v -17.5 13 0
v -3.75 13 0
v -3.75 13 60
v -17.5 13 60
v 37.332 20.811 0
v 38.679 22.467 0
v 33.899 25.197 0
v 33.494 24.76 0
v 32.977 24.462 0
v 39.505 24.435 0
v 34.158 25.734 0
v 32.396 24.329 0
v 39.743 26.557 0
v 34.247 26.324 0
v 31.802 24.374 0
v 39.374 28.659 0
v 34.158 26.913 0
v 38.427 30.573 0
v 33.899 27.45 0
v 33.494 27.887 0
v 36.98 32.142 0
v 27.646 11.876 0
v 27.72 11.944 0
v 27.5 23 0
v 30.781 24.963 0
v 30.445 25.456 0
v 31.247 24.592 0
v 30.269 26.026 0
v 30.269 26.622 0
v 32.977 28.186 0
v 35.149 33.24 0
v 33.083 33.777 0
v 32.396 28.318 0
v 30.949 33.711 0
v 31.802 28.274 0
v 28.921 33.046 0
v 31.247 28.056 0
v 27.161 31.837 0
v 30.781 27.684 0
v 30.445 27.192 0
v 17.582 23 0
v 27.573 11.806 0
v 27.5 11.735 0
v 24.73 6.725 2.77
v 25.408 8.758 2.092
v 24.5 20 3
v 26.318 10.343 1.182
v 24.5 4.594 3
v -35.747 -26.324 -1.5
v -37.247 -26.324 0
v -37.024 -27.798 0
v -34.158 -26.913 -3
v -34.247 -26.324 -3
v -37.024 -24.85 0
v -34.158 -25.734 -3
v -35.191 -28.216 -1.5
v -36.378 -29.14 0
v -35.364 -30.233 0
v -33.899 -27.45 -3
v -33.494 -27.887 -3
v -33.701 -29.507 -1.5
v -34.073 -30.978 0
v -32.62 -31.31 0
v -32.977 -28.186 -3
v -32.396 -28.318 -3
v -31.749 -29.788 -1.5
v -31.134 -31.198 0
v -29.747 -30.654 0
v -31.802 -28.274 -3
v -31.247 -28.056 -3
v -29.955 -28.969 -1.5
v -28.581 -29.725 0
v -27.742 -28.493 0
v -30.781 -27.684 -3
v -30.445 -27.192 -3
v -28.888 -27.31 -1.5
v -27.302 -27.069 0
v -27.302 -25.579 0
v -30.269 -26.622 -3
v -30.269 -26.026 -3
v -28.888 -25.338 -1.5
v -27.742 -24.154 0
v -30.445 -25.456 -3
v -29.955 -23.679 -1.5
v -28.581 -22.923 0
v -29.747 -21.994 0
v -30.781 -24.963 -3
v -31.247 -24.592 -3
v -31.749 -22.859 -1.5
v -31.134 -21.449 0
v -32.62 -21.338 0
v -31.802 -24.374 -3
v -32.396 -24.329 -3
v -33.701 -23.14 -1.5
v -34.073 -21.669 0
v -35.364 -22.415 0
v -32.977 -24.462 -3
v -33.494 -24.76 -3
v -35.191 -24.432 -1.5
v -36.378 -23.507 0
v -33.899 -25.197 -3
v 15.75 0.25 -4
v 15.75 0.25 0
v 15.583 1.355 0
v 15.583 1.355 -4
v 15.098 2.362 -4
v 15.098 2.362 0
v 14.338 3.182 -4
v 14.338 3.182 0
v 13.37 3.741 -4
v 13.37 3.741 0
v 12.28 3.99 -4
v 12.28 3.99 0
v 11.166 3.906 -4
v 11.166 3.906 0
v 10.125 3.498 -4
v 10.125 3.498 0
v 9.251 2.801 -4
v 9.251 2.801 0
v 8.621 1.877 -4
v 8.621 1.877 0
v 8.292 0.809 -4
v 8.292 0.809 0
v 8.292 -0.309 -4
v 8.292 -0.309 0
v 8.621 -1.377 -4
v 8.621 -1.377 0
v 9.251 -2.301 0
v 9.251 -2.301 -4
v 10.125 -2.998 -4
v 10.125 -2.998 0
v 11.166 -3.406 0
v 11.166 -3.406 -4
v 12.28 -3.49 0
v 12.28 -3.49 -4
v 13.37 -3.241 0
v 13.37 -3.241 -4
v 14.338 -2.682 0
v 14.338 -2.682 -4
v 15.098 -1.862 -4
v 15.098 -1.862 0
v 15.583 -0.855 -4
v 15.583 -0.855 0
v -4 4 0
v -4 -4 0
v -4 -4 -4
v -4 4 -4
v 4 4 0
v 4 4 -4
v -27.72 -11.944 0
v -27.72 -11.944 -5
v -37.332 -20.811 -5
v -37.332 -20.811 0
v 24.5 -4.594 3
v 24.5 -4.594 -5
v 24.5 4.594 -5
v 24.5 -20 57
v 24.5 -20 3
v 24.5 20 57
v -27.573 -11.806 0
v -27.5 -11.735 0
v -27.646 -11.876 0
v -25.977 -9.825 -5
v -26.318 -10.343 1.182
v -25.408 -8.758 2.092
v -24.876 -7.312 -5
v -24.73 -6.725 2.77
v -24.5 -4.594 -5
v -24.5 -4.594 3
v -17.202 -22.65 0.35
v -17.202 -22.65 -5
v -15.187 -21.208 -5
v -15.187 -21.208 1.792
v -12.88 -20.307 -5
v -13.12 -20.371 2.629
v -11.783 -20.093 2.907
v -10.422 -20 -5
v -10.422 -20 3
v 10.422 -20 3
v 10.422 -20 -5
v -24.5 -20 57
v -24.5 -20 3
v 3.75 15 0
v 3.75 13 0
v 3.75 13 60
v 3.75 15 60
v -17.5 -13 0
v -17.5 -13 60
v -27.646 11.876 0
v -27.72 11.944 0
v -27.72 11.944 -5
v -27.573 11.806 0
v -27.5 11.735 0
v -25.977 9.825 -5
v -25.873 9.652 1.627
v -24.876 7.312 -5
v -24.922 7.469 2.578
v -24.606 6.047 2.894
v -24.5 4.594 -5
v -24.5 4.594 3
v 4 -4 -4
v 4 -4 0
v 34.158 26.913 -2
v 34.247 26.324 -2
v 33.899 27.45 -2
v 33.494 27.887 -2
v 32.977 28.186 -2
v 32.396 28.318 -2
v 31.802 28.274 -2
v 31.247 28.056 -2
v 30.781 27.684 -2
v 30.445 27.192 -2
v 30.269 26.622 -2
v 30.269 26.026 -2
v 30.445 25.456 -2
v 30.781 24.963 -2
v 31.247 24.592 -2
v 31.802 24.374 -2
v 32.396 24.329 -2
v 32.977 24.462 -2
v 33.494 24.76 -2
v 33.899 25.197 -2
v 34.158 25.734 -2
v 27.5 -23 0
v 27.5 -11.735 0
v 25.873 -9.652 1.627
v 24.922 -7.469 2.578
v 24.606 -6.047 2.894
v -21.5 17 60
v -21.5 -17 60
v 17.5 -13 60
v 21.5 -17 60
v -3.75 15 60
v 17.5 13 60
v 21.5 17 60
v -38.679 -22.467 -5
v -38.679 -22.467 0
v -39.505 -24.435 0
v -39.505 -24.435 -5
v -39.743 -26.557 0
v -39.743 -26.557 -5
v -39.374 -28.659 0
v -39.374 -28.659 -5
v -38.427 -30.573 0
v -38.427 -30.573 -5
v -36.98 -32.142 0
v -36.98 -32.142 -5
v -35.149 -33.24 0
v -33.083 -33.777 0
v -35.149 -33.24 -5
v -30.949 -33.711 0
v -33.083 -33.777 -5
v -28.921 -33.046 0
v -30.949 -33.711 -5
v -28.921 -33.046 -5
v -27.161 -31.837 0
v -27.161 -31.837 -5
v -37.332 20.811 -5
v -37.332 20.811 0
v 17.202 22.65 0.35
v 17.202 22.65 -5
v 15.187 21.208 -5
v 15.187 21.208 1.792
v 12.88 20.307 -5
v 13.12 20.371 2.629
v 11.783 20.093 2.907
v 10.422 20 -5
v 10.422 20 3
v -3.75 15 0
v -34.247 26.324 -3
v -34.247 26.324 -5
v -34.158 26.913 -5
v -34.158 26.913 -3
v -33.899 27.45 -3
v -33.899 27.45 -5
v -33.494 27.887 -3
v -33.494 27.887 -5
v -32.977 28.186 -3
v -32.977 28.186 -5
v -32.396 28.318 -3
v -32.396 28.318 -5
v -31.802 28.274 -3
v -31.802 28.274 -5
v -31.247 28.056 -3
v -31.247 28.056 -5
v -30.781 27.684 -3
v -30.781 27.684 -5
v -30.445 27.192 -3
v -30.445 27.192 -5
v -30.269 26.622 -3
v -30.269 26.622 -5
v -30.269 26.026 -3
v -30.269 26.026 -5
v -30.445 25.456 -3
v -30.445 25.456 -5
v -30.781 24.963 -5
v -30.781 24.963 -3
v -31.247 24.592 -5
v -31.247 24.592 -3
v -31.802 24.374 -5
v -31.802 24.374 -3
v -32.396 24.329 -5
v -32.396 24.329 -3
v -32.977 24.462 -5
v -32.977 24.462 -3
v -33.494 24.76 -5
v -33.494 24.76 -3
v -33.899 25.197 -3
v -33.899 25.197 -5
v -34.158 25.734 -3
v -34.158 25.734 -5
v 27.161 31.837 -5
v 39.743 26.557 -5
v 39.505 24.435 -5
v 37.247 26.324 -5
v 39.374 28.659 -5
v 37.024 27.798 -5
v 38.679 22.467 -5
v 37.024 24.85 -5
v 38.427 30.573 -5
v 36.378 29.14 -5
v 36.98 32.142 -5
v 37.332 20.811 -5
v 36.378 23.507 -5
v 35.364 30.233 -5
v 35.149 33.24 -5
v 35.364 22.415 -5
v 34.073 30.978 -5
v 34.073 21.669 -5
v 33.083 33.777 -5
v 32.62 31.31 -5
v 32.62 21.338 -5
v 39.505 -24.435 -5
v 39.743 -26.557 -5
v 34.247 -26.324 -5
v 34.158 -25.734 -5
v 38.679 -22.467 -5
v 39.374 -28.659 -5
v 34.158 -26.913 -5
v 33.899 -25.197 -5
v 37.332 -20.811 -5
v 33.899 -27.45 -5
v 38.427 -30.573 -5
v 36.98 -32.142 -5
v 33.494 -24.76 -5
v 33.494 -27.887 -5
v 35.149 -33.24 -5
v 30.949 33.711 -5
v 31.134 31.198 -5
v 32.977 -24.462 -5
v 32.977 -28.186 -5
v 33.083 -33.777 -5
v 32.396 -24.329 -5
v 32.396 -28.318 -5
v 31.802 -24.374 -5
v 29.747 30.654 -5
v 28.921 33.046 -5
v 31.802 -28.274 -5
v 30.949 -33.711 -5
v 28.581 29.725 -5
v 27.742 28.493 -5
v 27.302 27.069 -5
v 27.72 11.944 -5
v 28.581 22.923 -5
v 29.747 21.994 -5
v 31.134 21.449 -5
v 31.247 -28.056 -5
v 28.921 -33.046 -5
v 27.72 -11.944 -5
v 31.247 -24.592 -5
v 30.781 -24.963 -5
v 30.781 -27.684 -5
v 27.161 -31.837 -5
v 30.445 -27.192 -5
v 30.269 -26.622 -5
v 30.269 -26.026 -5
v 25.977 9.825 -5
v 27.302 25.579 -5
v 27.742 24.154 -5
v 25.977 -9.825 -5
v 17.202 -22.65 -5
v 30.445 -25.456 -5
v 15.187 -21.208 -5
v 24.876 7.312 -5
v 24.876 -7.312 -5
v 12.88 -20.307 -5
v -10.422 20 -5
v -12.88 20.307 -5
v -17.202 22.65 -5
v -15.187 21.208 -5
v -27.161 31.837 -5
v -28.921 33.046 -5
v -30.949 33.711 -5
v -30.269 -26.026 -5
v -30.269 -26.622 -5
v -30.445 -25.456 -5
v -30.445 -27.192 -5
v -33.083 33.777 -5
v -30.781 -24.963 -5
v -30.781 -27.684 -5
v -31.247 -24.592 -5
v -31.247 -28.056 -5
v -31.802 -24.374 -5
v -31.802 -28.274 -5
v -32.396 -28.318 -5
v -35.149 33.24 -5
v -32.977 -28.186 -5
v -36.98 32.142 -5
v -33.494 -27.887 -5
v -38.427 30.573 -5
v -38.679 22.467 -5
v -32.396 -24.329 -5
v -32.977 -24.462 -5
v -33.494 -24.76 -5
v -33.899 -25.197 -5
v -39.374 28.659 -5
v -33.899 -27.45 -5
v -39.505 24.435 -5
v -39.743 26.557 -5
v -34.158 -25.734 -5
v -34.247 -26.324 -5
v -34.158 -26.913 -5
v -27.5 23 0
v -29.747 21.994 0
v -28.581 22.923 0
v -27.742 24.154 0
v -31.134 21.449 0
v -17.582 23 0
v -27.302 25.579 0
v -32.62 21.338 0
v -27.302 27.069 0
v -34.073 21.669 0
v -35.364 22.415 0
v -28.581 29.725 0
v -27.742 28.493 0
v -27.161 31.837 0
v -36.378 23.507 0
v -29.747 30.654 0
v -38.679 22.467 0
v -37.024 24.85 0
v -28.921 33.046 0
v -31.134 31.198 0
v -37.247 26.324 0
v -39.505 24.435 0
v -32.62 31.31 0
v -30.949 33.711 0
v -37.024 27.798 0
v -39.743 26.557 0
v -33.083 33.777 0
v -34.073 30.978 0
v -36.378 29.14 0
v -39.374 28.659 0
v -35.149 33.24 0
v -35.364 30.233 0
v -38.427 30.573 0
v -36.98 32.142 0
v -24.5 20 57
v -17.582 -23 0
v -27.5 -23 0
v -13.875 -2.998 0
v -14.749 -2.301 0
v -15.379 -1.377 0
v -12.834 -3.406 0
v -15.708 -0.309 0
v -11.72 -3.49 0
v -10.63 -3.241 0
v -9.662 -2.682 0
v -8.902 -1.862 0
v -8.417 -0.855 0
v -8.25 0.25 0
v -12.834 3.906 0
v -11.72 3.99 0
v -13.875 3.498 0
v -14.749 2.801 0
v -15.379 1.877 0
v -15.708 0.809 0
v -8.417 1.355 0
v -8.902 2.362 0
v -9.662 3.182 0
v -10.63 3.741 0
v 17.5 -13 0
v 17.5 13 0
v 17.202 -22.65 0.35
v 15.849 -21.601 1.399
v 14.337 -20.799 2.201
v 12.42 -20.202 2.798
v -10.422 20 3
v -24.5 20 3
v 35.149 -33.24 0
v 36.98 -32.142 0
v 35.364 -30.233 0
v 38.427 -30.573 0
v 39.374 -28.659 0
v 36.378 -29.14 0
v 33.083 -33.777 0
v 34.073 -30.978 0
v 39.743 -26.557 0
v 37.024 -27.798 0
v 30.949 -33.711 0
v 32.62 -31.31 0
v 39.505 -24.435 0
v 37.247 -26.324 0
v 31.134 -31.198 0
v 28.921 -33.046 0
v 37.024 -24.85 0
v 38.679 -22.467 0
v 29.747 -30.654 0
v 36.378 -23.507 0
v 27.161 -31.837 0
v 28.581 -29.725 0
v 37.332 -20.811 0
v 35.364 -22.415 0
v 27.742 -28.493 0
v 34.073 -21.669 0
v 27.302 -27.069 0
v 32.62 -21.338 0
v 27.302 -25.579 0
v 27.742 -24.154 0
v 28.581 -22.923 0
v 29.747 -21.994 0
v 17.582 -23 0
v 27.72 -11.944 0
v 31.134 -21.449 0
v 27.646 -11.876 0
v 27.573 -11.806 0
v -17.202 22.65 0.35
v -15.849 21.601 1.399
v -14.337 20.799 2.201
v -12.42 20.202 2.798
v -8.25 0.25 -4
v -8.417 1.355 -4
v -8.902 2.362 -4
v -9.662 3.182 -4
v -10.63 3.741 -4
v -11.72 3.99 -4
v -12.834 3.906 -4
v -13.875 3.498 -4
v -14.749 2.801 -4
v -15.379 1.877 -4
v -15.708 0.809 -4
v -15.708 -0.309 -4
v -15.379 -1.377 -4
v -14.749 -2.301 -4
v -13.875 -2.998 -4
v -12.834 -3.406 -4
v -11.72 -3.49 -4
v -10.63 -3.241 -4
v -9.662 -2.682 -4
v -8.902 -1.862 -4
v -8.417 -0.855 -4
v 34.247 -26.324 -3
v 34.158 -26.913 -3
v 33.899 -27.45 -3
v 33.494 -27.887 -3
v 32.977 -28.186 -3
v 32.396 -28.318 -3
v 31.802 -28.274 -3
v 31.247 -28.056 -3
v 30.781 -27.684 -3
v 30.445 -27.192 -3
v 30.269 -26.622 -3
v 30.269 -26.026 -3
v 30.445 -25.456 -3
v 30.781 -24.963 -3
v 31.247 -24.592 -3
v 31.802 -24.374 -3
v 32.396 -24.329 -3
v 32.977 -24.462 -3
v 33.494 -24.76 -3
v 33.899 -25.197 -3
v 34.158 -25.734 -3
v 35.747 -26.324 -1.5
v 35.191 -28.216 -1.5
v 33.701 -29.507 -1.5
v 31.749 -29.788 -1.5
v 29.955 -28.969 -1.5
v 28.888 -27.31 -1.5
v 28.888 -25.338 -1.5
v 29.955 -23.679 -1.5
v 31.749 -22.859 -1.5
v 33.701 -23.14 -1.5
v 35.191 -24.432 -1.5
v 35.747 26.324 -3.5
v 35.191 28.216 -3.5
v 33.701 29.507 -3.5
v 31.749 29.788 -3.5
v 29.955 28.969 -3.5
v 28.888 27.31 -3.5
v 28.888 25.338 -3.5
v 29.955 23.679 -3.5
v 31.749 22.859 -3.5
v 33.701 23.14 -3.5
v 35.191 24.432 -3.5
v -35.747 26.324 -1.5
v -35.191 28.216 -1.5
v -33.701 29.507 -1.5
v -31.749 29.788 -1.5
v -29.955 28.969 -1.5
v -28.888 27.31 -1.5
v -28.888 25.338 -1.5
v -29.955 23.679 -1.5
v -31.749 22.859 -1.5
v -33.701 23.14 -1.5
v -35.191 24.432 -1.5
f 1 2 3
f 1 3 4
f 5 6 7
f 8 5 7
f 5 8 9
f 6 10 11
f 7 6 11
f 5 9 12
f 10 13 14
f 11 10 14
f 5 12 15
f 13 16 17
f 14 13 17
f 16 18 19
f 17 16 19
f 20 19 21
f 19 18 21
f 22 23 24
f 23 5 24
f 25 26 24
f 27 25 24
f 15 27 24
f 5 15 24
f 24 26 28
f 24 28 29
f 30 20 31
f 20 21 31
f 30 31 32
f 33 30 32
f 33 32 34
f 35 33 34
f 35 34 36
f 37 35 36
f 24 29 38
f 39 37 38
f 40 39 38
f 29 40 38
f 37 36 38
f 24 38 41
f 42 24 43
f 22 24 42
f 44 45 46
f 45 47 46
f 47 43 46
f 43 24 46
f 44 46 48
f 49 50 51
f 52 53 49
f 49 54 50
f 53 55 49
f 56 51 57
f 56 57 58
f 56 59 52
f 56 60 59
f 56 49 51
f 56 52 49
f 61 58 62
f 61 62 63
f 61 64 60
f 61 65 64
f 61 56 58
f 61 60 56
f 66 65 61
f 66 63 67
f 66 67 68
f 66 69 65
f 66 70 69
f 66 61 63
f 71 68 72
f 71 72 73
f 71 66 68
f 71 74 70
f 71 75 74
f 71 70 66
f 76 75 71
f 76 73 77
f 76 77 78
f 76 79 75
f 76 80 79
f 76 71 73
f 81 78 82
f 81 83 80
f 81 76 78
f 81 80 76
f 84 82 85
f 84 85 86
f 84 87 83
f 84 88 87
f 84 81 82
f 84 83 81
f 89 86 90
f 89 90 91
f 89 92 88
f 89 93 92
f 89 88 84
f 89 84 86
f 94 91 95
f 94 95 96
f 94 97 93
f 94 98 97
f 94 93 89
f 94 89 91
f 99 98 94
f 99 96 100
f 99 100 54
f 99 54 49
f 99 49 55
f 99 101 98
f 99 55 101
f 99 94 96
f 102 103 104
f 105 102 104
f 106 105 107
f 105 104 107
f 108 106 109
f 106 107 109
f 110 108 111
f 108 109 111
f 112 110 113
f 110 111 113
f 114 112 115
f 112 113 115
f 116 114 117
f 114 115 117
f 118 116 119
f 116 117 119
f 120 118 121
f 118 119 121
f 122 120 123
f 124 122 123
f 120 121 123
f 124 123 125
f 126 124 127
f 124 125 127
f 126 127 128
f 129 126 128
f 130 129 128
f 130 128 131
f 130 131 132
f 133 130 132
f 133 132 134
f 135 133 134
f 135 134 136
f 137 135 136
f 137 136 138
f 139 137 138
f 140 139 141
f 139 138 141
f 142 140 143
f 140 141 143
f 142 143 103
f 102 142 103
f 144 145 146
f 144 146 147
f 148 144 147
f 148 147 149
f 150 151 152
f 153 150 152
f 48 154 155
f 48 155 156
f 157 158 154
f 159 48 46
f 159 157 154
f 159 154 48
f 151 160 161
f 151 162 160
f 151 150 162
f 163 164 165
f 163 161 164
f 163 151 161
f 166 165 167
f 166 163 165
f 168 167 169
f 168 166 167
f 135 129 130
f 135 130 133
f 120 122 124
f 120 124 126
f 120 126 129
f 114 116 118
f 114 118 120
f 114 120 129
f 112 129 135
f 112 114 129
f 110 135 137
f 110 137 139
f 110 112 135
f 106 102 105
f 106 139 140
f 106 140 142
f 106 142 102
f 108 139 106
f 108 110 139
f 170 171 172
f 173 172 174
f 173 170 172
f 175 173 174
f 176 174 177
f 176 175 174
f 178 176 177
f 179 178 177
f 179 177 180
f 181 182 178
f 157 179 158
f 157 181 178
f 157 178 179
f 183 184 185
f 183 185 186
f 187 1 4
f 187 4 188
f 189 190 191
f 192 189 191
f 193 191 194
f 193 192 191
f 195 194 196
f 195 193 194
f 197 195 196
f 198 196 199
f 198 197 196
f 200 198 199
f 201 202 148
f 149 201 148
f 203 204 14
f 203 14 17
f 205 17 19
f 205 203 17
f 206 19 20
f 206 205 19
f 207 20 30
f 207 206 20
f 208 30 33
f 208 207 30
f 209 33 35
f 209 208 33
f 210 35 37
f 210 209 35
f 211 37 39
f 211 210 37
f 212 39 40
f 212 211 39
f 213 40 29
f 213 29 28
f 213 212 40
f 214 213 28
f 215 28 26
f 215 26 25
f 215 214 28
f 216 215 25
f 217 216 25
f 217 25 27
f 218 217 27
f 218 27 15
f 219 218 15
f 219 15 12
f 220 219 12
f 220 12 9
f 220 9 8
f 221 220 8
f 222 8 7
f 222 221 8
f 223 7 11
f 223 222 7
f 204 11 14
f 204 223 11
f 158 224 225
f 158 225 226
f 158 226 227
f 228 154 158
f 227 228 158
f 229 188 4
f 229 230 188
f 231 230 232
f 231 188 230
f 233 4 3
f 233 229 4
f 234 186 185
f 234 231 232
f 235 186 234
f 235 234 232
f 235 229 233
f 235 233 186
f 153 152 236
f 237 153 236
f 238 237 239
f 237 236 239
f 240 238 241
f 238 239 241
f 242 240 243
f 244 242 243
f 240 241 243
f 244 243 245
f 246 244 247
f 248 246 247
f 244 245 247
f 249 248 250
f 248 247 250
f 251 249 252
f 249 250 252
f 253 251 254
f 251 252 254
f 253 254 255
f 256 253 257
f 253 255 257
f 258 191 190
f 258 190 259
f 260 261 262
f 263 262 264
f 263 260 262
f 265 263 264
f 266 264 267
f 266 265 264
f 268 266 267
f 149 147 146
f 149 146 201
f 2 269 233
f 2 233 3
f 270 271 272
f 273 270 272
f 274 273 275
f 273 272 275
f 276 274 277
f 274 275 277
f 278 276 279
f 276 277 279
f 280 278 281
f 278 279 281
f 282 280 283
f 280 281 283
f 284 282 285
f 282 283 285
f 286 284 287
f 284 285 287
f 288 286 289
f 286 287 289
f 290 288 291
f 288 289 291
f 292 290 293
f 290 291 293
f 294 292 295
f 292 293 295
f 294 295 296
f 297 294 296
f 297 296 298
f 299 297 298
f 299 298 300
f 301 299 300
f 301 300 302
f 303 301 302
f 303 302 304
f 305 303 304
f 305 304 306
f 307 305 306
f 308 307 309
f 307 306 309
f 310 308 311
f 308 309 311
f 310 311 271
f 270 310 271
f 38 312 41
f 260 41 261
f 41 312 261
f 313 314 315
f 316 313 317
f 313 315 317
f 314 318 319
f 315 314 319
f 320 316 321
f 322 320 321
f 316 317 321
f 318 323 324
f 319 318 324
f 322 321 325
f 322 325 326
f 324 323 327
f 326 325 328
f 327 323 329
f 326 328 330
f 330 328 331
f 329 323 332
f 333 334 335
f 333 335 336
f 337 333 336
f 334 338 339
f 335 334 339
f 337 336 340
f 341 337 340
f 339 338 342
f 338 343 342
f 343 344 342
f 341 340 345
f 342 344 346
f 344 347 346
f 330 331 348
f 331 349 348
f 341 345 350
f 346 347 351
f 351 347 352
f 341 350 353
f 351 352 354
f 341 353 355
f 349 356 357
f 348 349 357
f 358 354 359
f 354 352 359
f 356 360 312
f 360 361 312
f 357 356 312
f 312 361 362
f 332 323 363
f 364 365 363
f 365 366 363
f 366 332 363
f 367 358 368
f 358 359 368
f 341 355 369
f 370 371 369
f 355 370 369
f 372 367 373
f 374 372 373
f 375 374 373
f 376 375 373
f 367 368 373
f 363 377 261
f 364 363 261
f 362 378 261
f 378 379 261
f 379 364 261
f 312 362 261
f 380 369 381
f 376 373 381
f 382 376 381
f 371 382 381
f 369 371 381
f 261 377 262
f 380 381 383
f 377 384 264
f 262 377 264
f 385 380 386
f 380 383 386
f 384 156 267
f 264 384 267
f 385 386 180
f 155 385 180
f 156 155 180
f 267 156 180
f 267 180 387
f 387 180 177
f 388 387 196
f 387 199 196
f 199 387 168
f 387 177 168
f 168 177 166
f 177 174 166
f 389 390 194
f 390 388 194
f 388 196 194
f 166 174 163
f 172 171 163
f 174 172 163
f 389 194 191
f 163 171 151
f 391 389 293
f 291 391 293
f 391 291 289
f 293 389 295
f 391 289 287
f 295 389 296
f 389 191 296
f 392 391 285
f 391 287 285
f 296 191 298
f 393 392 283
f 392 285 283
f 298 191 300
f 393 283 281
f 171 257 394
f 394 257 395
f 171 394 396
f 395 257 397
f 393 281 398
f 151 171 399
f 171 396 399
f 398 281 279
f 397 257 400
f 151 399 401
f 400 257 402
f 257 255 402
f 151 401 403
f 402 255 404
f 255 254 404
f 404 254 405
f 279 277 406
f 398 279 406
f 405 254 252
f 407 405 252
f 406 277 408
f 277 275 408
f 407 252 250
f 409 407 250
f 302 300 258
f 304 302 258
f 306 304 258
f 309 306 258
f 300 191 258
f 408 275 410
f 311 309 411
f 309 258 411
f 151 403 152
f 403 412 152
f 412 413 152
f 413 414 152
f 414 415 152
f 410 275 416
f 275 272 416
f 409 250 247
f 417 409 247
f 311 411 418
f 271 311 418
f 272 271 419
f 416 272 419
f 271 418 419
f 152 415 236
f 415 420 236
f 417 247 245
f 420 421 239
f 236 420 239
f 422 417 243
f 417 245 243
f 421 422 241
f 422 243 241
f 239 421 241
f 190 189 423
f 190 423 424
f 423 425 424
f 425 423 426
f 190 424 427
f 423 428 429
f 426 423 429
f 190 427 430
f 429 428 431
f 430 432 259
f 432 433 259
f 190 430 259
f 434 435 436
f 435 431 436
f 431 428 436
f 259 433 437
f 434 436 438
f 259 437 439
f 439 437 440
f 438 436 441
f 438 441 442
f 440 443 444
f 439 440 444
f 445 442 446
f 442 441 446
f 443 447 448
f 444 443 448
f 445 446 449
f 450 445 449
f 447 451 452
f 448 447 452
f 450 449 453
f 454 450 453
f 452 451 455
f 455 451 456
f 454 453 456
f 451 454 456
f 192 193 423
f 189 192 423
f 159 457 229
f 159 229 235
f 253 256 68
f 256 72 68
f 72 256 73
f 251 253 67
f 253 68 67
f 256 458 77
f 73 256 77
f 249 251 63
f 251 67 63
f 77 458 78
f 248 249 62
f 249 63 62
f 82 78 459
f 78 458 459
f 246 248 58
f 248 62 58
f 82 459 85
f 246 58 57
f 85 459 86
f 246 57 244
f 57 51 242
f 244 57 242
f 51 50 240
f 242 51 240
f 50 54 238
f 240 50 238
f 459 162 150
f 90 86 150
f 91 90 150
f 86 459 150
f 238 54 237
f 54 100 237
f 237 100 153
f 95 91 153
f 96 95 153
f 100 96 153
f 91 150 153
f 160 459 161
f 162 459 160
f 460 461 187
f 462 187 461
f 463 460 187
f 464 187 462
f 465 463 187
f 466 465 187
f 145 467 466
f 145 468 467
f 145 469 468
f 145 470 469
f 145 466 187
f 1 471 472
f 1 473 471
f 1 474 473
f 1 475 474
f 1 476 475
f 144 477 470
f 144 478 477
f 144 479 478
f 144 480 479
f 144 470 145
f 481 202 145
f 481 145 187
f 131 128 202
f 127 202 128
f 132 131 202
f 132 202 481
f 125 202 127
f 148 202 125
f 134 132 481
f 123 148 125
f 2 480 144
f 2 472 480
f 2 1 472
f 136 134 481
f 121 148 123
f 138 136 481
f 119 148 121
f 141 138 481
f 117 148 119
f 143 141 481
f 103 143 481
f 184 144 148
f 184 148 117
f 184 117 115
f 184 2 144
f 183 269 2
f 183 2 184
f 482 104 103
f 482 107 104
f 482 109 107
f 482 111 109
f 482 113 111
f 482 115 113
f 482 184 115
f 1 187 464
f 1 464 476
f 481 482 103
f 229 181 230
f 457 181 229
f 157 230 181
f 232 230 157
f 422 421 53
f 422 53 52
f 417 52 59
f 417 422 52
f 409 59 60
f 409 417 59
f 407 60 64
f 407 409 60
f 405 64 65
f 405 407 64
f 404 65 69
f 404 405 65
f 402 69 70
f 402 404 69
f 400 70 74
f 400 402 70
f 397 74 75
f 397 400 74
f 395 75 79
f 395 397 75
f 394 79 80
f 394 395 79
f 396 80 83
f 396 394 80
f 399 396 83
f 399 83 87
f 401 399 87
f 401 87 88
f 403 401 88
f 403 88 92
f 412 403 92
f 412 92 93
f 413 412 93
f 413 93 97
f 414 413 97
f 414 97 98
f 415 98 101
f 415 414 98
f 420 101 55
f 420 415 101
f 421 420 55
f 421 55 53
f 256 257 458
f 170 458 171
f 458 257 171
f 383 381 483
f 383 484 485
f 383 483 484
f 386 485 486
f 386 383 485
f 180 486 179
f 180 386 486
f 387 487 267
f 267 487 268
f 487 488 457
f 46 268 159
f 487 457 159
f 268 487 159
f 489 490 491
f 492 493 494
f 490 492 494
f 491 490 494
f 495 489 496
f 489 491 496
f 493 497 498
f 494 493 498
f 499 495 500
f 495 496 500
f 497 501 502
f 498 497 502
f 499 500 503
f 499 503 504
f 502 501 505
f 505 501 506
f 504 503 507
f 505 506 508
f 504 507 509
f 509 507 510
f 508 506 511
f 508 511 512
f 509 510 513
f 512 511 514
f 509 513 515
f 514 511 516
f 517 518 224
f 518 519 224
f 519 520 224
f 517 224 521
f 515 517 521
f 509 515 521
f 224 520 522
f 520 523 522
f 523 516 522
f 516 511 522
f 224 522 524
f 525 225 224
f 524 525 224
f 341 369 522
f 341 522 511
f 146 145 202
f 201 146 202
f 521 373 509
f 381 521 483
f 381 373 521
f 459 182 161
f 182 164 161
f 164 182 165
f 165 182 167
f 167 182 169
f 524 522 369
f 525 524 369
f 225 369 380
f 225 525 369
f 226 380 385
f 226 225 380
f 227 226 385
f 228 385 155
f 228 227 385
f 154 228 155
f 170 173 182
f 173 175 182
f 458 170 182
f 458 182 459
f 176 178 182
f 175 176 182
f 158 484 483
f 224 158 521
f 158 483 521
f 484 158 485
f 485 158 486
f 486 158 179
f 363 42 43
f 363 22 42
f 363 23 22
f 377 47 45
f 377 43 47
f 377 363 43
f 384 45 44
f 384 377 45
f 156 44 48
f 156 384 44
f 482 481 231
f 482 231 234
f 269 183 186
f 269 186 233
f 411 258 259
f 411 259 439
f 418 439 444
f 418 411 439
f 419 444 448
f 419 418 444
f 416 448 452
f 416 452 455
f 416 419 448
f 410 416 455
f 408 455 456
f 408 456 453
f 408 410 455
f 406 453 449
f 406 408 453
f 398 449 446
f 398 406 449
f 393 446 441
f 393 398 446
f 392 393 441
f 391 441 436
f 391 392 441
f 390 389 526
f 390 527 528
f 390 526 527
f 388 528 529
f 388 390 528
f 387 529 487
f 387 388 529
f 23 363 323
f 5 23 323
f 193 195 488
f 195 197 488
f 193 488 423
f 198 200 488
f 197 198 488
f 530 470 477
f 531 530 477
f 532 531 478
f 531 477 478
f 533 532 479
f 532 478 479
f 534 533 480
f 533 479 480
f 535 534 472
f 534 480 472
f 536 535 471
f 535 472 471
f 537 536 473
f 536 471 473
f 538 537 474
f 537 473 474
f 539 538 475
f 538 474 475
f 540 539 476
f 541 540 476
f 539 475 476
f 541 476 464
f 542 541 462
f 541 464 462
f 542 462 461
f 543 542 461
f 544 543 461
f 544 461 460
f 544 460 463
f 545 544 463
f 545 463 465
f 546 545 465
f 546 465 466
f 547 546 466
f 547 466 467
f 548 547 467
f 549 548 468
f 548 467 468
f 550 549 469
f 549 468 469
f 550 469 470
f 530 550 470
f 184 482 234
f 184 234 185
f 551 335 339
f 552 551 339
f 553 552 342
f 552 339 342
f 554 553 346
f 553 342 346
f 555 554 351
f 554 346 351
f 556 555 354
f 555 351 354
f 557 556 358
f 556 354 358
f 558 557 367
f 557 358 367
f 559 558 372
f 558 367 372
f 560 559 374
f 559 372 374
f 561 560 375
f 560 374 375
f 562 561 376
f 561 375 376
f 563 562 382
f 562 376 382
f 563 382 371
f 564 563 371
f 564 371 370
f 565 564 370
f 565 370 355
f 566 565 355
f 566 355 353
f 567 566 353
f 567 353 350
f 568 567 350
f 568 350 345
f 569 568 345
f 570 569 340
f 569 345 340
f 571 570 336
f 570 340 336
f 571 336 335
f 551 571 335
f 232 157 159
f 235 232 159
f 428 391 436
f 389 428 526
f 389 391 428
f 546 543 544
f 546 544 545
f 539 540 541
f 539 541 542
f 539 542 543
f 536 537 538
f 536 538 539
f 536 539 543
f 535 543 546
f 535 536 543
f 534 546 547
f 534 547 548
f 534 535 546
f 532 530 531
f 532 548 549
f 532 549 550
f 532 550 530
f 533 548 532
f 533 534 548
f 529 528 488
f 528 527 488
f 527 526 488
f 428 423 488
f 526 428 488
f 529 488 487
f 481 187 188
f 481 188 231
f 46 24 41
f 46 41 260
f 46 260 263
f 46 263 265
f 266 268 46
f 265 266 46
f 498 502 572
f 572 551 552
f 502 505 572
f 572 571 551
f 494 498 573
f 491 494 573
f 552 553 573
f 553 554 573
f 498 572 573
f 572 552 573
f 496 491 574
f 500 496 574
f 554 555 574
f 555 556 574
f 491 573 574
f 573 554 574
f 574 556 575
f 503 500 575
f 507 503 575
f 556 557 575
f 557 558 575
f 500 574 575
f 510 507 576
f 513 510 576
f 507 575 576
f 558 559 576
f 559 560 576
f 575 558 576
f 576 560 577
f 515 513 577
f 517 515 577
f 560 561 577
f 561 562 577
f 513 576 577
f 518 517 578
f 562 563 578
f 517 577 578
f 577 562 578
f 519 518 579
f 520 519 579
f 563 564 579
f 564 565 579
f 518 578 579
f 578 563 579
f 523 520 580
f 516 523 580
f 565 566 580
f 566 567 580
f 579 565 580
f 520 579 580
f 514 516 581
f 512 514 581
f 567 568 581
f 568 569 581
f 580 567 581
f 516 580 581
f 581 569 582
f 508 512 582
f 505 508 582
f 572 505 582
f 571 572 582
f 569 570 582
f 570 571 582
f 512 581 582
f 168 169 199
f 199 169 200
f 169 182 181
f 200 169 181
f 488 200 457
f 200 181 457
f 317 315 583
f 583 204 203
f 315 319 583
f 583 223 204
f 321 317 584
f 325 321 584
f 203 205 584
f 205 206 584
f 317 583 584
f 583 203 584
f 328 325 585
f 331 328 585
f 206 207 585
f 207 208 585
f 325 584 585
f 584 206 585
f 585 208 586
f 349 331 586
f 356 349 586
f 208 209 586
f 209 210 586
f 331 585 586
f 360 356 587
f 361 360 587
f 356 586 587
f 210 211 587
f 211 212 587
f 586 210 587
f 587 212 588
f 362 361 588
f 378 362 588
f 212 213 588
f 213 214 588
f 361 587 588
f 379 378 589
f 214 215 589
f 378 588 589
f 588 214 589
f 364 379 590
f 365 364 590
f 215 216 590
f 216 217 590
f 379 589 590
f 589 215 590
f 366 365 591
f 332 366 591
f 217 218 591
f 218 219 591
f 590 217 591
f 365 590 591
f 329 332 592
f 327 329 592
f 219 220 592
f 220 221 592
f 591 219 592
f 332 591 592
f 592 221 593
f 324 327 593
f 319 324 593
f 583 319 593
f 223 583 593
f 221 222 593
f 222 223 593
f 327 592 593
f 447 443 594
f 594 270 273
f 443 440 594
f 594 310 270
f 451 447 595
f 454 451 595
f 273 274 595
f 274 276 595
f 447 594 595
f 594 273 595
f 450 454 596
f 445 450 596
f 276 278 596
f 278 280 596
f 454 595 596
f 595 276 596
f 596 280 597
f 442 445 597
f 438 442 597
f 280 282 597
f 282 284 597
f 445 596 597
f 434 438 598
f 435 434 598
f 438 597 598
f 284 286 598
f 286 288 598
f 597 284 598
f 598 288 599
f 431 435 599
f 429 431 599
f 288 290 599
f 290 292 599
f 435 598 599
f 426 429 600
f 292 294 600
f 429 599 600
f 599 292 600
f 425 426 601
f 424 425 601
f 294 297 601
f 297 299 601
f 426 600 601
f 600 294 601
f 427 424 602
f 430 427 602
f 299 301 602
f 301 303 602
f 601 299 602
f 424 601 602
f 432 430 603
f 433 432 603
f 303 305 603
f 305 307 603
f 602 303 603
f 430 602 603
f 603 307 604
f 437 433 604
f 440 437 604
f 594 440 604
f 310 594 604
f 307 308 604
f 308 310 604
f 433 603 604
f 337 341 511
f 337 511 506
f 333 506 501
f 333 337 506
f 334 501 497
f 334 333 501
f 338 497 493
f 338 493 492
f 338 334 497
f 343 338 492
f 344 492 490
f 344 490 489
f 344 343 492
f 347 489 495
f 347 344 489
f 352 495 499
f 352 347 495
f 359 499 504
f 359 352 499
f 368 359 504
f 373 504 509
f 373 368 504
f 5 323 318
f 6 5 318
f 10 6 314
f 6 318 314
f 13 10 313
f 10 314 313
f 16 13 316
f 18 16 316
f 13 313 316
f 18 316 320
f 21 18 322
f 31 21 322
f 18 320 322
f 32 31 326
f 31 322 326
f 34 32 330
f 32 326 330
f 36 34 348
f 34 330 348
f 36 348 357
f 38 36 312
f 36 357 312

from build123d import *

# Parameters (mm, degrees)
SKETCH1_W               = 49
SKETCH1_H               = 40
BOSS_EXTRUDE1_DEPTH     = 60
SKETCH2_W               = 49
SKETCH2_H               = 40
BOSS_EXTRUDE2_DEPTH     = 5
SKETCH3_R               = 3.75
SKETCH3_W               = 8
SKETCH3_H               = 8
CUT_EXTRUDE1_DEPTH      = 4
SKETCH4_R               = 2
BOSS_EXTRUDE3_DEPTH     = 5
MIRROR2_COPY_1_SKETCH_R = 2
MIRROR2_COPY_1_DEPTH    = 5
CHAMFER2_SIZE           = 3
FILLET1_R               = 10
CHAMFER3_SIZE           = 3


with BuildPart() as part:
    # Sketch1 → Boss-Extrude1 (new body)
    with BuildSketch(Plane.XY):
        Rectangle(SKETCH1_W, SKETCH1_H)
        Polygon((-17.5, -13), (17.5, -13), (17.5, 13), (3.75, 13), (3.75, 15), (-3.75, 15), (-3.75, 13), (-17.5, 13), align=None, mode=Mode.SUBTRACT)
    extrude(amount=BOSS_EXTRUDE1_DEPTH)

    # Sketch2 → Boss-Extrude2 (add)
    with BuildSketch(Plane.XY):
        Rectangle(SKETCH2_W, SKETCH2_H)
    extrude(amount=-BOSS_EXTRUDE2_DEPTH)

    # Sketch3 → Cut-Extrude1 (cut)
    with BuildSketch(Plane.XY):
        with Locations((12, 0.25)):
            Circle(SKETCH3_R)
        with Locations((-12, 0.25)):
            Circle(SKETCH3_R)
        Rectangle(SKETCH3_W, SKETCH3_H)
    extrude(amount=-CUT_EXTRUDE1_DEPTH, mode=Mode.SUBTRACT)

    # Sketch4 → Boss-Extrude3 (add)
    with BuildSketch(Plane(origin=(0, 0, -5), x_dir=(-1, 0, 0), z_dir=(0, 0, -1))):
        with BuildLine():
            Line((27.161413951, 31.836546483), (14.329603899, 20))
            Line((14.329603899, 20), (24.5, 8.974436833))
            Line((24.5, 8.974436833), (37.331810052, 20.810983316))
            ThreePointArc((37.331810052, 20.810983316), (37.759393585, 31.40896295), (27.161413951, 31.836546483))
        make_face()
        with Locations((32.246612001, 26.323764899)):
            Circle(SKETCH4_R, mode=Mode.SUBTRACT)
    boss_extrude3 = extrude(amount=-BOSS_EXTRUDE3_DEPTH)

    # Mirror1: Boss-Extrude3 across plane
    add(boss_extrude3.mirror(Plane.ZX))

    # Mirror2: Boss-Extrude3 across plane
    add(boss_extrude3.mirror(Plane(origin=(0, 0, 0), x_dir=(0, 0, 1), z_dir=(1, 0, 0))))

    # Mirror2 copy 1 sketch → Mirror2 copy 1 (add)
    with BuildSketch(Plane(origin=(0, 0, -5), x_dir=(1, 0, 0), z_dir=(0, 0, -1))):
        with BuildLine():
            Line((27.161413951, 31.836546483), (14.329603899, 20))
            Line((14.329603899, 20), (24.5, 8.974436833))
            Line((24.5, 8.974436833), (37.331810052, 20.810983316))
            ThreePointArc((37.331810052, 20.810983316), (37.759393585, 31.40896295), (27.161413951, 31.836546483))
        make_face()
        with Locations((32.246612001, 26.323764899)):
            Circle(MIRROR2_COPY_1_SKETCH_R, mode=Mode.SUBTRACT)
    extrude(amount=-MIRROR2_COPY_1_DEPTH)

    # Chamfer2
    chamfer2_edges = [part.edges().sort_by_distance(p)[0] for p in [
        (-30.246612001, -26.323764899, 0),
        (24.5, -14.487218417, 0),
        (30.246612001, -26.323764899, 0),
        (19.414801949, -20, 0),
        (19.414801949, 20, 0),
        (24.5, 14.487218417, 0),
        (30.246612001, 26.323764899, -5),
        (-19.414801949, 20, 0),
        (-30.246612001, 26.323764899, 0),
        (-24.5, 14.487218417, 0),
        (-19.414801949, -20, 0),
        (-24.5, -14.487218417, 0),
    ]]
    chamfer(chamfer2_edges, length=CHAMFER2_SIZE)

    # Fillet1
    # the kernel refuses this fillet: 10 mm, written as the material it adds along each edge
    with BuildSketch(Plane(origin=(-14.329603899, -20, 12.769621541), x_dir=(1, 0, 0), z_dir=(0, 0, -1))) as fillet1_piece_1_section:
        with BuildLine():
            CenterArc((FILLET1_R * 0.390784861631, FILLET1_R), FILLET1_R, 227.310388658, 42.689611342)
            Line((-FILLET1_R * 0.287241545106, FILLET1_R * 0.264962455539), (0, 0))
            Line((0, 0), (FILLET1_R * 0.390784861631, 0))
        make_face()
    fillet1_piece_1 = extrude(amount=17.769621541, mode=Mode.PRIVATE)
    fillet1_piece_1 = split(fillet1_piece_1, bisect_by=Plane(origin=(-13.989510019, -22.368902141, 0.631097859), z_dir=(0, 0.7071067811865476, -0.7071067811865476)), keep=Keep.TOP, mode=Mode.PRIVATE)
    add(fillet1_piece_1)
    with BuildSketch(Plane(origin=(14.329603899, -20, -5), x_dir=(-1, 0, 0), z_dir=(0, 0, 1))) as fillet1_piece_2_section:
        with BuildLine():
            CenterArc((FILLET1_R * 0.390784861631, FILLET1_R), FILLET1_R, 227.310388658, 42.689611342)
            Line((-FILLET1_R * 0.287241545106, FILLET1_R * 0.264962455539), (0, 0))
            Line((0, 0), (FILLET1_R * 0.390784861631, 0))
        make_face()
    fillet1_piece_2 = extrude(amount=17.769621541, mode=Mode.PRIVATE)
    fillet1_piece_2 = split(fillet1_piece_2, bisect_by=Plane(origin=(13.989510019, -22.368902141, 0.631097859), z_dir=(0, 0.7071067811865476, -0.7071067811865476)), keep=Keep.TOP, mode=Mode.PRIVATE)
    add(fillet1_piece_2)
    with BuildSketch(Plane(origin=(-24.5, 8.974436833, 13.950923381), x_dir=(-0.7350375444611025, 0.6780264067369298, 0), z_dir=(0, 0, -1))) as fillet1_piece_3_section:
        with BuildLine():
            CenterArc((FILLET1_R * 0.438036935241, -FILLET1_R), FILLET1_R, 90, 47.310388658)
            Line((-FILLET1_R * 0.29700060922, -FILLET1_R * 0.321973593263), (0, 0))
            Line((0, 0), (FILLET1_R * 0.438036935241, 0))
        make_face()
    fillet1_piece_3 = extrude(amount=18.950923381, mode=Mode.PRIVATE)
    fillet1_piece_3 = split(fillet1_piece_3, bisect_by=Plane(origin=(-24.902442497, 8.18834841, 0), z_dir=(0, 0, 1)), keep=Keep.TOP, mode=Mode.PRIVATE)
    fillet1_piece_3 = split(fillet1_piece_3, bisect_by=Plane(origin=(-25.551831873, 8.18834841, 1.948168127), z_dir=(0.7071067811865476, 0, -0.7071067811865476)), keep=Keep.TOP, mode=Mode.PRIVATE)
    add(fillet1_piece_3)
    with BuildSketch(Plane(origin=(-24.5, 8.974436833, 13.950923381), x_dir=(-0.7350375444611025, 0.6780264067369298, 0), z_dir=(0, 0, -1))) as fillet1_piece_4_section:
        with BuildLine():
            CenterArc((FILLET1_R * 0.438036935241, -FILLET1_R), FILLET1_R, 90, 47.310388658)
            Line((-FILLET1_R * 0.29700060922, -FILLET1_R * 0.321973593263), (0, 0))
            Line((0, 0), (FILLET1_R * 0.438036935241, 0))
        make_face()
    fillet1_piece_4 = extrude(amount=18.950923381, mode=Mode.PRIVATE)
    fillet1_piece_4 = split(fillet1_piece_4, bisect_by=Plane(origin=(-27.613706102, 11.943996137, 0), z_dir=(0, 0, -1)), keep=Keep.TOP, mode=Mode.PRIVATE)
    fillet1_piece_4 = split(fillet1_piece_4, bisect_by=Plane(origin=(-27.585279578, 11.943996137, -0.085279578), z_dir=(-0.7071067811865476, 0, 0.7071067811865476)), keep=Keep.TOP, mode=Mode.PRIVATE)
    add(fillet1_piece_4)
    with BuildSketch(Plane(origin=(-24.5, 8.974436833, 13.950923381), x_dir=(-0.7350375444611025, 0.6780264067369298, 0), z_dir=(0, 0, -1))) as fillet1_piece_5_section:
        with BuildLine():
            CenterArc((FILLET1_R * 0.438036935241, -FILLET1_R), FILLET1_R, 90, 47.310388658)
            Line((-FILLET1_R * 0.29700060922, -FILLET1_R * 0.321973593263), (0, 0))
            Line((0, 0), (FILLET1_R * 0.438036935241, 0))
        make_face()
    fillet1_piece_5 = extrude(amount=18.950923381, mode=Mode.PRIVATE)
    fillet1_piece_5 = split(fillet1_piece_5, bisect_by=Plane(origin=(-25.183285412, 8.674450436, 0), z_dir=(0, 0, -1)), keep=Keep.TOP, mode=Mode.PRIVATE)
    fillet1_piece_5 = split(fillet1_piece_5, bisect_by=Plane(origin=(-27.591834999, 8.674450436, -0.091834999), z_dir=(0.7071067811865476, 0, -0.7071067811865476)), keep=Keep.TOP, mode=Mode.PRIVATE)
    add(fillet1_piece_5)
    with BuildSketch(Plane(origin=(-24.5, -8.974436833, -5), x_dir=(-0.7350375444611025, -0.6780264067369298, 0), z_dir=(0, 0, 1))) as fillet1_piece_6_section:
        with BuildLine():
            CenterArc((FILLET1_R * 0.438036935241, -FILLET1_R), FILLET1_R, 90, 47.310388658)
            Line((-FILLET1_R * 0.29700060922, -FILLET1_R * 0.321973593263), (0, 0))
            Line((0, 0), (FILLET1_R * 0.438036935241, 0))
        make_face()
    fillet1_piece_6 = extrude(amount=18.950923381, mode=Mode.PRIVATE)
    fillet1_piece_6 = split(fillet1_piece_6, bisect_by=Plane(origin=(-25.183285412, -8.674450436, 0), z_dir=(0, 0, -1)), keep=Keep.TOP, mode=Mode.PRIVATE)
    fillet1_piece_6 = split(fillet1_piece_6, bisect_by=Plane(origin=(-27.591834999, -8.674450436, -0.091834999), z_dir=(0.7071067811865476, 0, -0.7071067811865476)), keep=Keep.TOP, mode=Mode.PRIVATE)
    add(fillet1_piece_6)
    with BuildSketch(Plane(origin=(-24.5, -8.974436833, -5), x_dir=(-0.7350375444611025, -0.6780264067369298, 0), z_dir=(0, 0, 1))) as fillet1_piece_7_section:
        with BuildLine():
            CenterArc((FILLET1_R * 0.438036935241, -FILLET1_R), FILLET1_R, 90, 47.310388658)
            Line((-FILLET1_R * 0.29700060922, -FILLET1_R * 0.321973593263), (0, 0))
            Line((0, 0), (FILLET1_R * 0.438036935241, 0))
        make_face()
    fillet1_piece_7 = extrude(amount=18.950923381, mode=Mode.PRIVATE)
    fillet1_piece_7 = split(fillet1_piece_7, bisect_by=Plane(origin=(-24.902442497, -8.18834841, 0), z_dir=(0, 0, 1)), keep=Keep.TOP, mode=Mode.PRIVATE)
    fillet1_piece_7 = split(fillet1_piece_7, bisect_by=Plane(origin=(-25.551831873, -8.18834841, 1.948168127), z_dir=(0.7071067811865476, 0, -0.7071067811865476)), keep=Keep.TOP, mode=Mode.PRIVATE)
    add(fillet1_piece_7)
    with BuildSketch(Plane(origin=(-24.5, -8.974436833, -5), x_dir=(-0.7350375444611025, -0.6780264067369298, 0), z_dir=(0, 0, 1))) as fillet1_piece_8_section:
        with BuildLine():
            CenterArc((FILLET1_R * 0.438036935241, -FILLET1_R), FILLET1_R, 90, 47.310388658)
            Line((-FILLET1_R * 0.29700060922, -FILLET1_R * 0.321973593263), (0, 0))
            Line((0, 0), (FILLET1_R * 0.438036935241, 0))
        make_face()
    fillet1_piece_8 = extrude(amount=18.950923381, mode=Mode.PRIVATE)
    fillet1_piece_8 = split(fillet1_piece_8, bisect_by=Plane(origin=(-27.613706102, -11.943996137, 0), z_dir=(0, 0, -1)), keep=Keep.TOP, mode=Mode.PRIVATE)
    fillet1_piece_8 = split(fillet1_piece_8, bisect_by=Plane(origin=(-27.585279578, -11.943996137, -0.085279578), z_dir=(-0.7071067811865476, 0, 0.7071067811865476)), keep=Keep.TOP, mode=Mode.PRIVATE)
    add(fillet1_piece_8)
    with BuildSketch(Plane(origin=(-14.329603899, 20, -5), x_dir=(1, 0, 0), z_dir=(0, 0, 1))) as fillet1_piece_9_section:
        with BuildLine():
            CenterArc((FILLET1_R * 0.390784861631, FILLET1_R), FILLET1_R, 227.310388658, 42.689611342)
            Line((-FILLET1_R * 0.287241545106, FILLET1_R * 0.264962455539), (0, 0))
            Line((0, 0), (FILLET1_R * 0.390784861631, 0))
        make_face()
    fillet1_piece_9 = extrude(amount=17.769621541, mode=Mode.PRIVATE)
    fillet1_piece_9 = split(fillet1_piece_9, bisect_by=Plane(origin=(-13.989510019, 22.368902141, 0.631097859), z_dir=(0, -0.7071067811865476, -0.7071067811865476)), keep=Keep.TOP, mode=Mode.PRIVATE)
    add(fillet1_piece_9)
    with BuildSketch(Plane(origin=(14.329603899, 20, 12.769621541), x_dir=(0.7350375444611016, 0.6780264067369309, 0), z_dir=(0, 0, -1))) as fillet1_piece_10_section:
        with BuildLine():
            CenterArc((FILLET1_R * 0.390784861631, -FILLET1_R), FILLET1_R, 90, 42.689611342)
            Line((-FILLET1_R * 0.287241545106, -FILLET1_R * 0.264962455539), (0, 0))
            Line((0, 0), (FILLET1_R * 0.390784861631, 0))
        make_face()
    fillet1_piece_10 = extrude(amount=17.769621541, mode=Mode.PRIVATE)
    fillet1_piece_10 = split(fillet1_piece_10, bisect_by=Plane(origin=(13.989510019, 22.368902141, 0.631097859), z_dir=(0, -0.7071067811865476, -0.7071067811865476)), keep=Keep.TOP, mode=Mode.PRIVATE)
    add(fillet1_piece_10)
    with BuildSketch(Plane(origin=(24.5, 8.974436833, -5), x_dir=(0.7350375444611025, 0.6780264067369298, 0), z_dir=(0, 0, 1))) as fillet1_piece_11_section:
        with BuildLine():
            CenterArc((FILLET1_R * 0.438036935241, -FILLET1_R), FILLET1_R, 90, 47.310388658)
            Line((-FILLET1_R * 0.29700060922, -FILLET1_R * 0.321973593263), (0, 0))
            Line((0, 0), (FILLET1_R * 0.438036935241, 0))
        make_face()
    fillet1_piece_11 = extrude(amount=18.950923381, mode=Mode.PRIVATE)
    fillet1_piece_11 = split(fillet1_piece_11, bisect_by=Plane(origin=(25.183285412, 8.674450436, 0), z_dir=(0, 0, -1)), keep=Keep.TOP, mode=Mode.PRIVATE)
    fillet1_piece_11 = split(fillet1_piece_11, bisect_by=Plane(origin=(27.591834999, 8.674450436, -0.091834999), z_dir=(-0.7071067811865476, 0, -0.7071067811865476)), keep=Keep.TOP, mode=Mode.PRIVATE)
    add(fillet1_piece_11)
    with BuildSketch(Plane(origin=(24.5, 8.974436833, -5), x_dir=(0.7350375444611025, 0.6780264067369298, 0), z_dir=(0, 0, 1))) as fillet1_piece_12_section:
        with BuildLine():
            CenterArc((FILLET1_R * 0.438036935241, -FILLET1_R), FILLET1_R, 90, 47.310388658)
            Line((-FILLET1_R * 0.29700060922, -FILLET1_R * 0.321973593263), (0, 0))
            Line((0, 0), (FILLET1_R * 0.438036935241, 0))
        make_face()
    fillet1_piece_12 = extrude(amount=18.950923381, mode=Mode.PRIVATE)
    fillet1_piece_12 = split(fillet1_piece_12, bisect_by=Plane(origin=(24.902442497, 8.18834841, 0), z_dir=(0, 0, 1)), keep=Keep.TOP, mode=Mode.PRIVATE)
    fillet1_piece_12 = split(fillet1_piece_12, bisect_by=Plane(origin=(25.551831873, 8.18834841, 1.948168127), z_dir=(-0.7071067811865476, 0, -0.7071067811865476)), keep=Keep.TOP, mode=Mode.PRIVATE)
    add(fillet1_piece_12)
    with BuildSketch(Plane(origin=(24.5, 8.974436833, -5), x_dir=(0.7350375444611025, 0.6780264067369298, 0), z_dir=(0, 0, 1))) as fillet1_piece_13_section:
        with BuildLine():
            CenterArc((FILLET1_R * 0.438036935241, -FILLET1_R), FILLET1_R, 90, 47.310388658)
            Line((-FILLET1_R * 0.29700060922, -FILLET1_R * 0.321973593263), (0, 0))
            Line((0, 0), (FILLET1_R * 0.438036935241, 0))
        make_face()
    fillet1_piece_13 = extrude(amount=18.950923381, mode=Mode.PRIVATE)
    fillet1_piece_13 = split(fillet1_piece_13, bisect_by=Plane(origin=(27.613706102, 11.943996137, 0), z_dir=(0, 0, -1)), keep=Keep.TOP, mode=Mode.PRIVATE)
    fillet1_piece_13 = split(fillet1_piece_13, bisect_by=Plane(origin=(27.585279578, 11.943996137, -0.085279578), z_dir=(0.7071067811865476, 0, 0.7071067811865476)), keep=Keep.TOP, mode=Mode.PRIVATE)
    add(fillet1_piece_13)
    with BuildSketch(Plane(origin=(24.5, -8.974436833, 13.950923381), x_dir=(0.7350375444611025, -0.6780264067369298, 0), z_dir=(0, 0, -1))) as fillet1_piece_14_section:
        with BuildLine():
            CenterArc((FILLET1_R * 0.438036935241, -FILLET1_R), FILLET1_R, 90, 47.310388658)
            Line((-FILLET1_R * 0.29700060922, -FILLET1_R * 0.321973593263), (0, 0))
            Line((0, 0), (FILLET1_R * 0.438036935241, 0))
        make_face()
    fillet1_piece_14 = extrude(amount=18.950923381, mode=Mode.PRIVATE)
    fillet1_piece_14 = split(fillet1_piece_14, bisect_by=Plane(origin=(24.902442497, -8.18834841, 0), z_dir=(0, 0, 1)), keep=Keep.TOP, mode=Mode.PRIVATE)
    fillet1_piece_14 = split(fillet1_piece_14, bisect_by=Plane(origin=(25.551831873, -8.18834841, 1.948168127), z_dir=(-0.7071067811865476, 0, -0.7071067811865476)), keep=Keep.TOP, mode=Mode.PRIVATE)
    add(fillet1_piece_14)
    with BuildSketch(Plane(origin=(24.5, -8.974436833, 13.950923381), x_dir=(0.7350375444611025, -0.6780264067369298, 0), z_dir=(0, 0, -1))) as fillet1_piece_15_section:
        with BuildLine():
            CenterArc((FILLET1_R * 0.438036935241, -FILLET1_R), FILLET1_R, 90, 47.310388658)
            Line((-FILLET1_R * 0.29700060922, -FILLET1_R * 0.321973593263), (0, 0))
            Line((0, 0), (FILLET1_R * 0.438036935241, 0))
        make_face()
    fillet1_piece_15 = extrude(amount=18.950923381, mode=Mode.PRIVATE)
    fillet1_piece_15 = split(fillet1_piece_15, bisect_by=Plane(origin=(27.613706102, -11.943996137, 0), z_dir=(0, 0, -1)), keep=Keep.TOP, mode=Mode.PRIVATE)
    fillet1_piece_15 = split(fillet1_piece_15, bisect_by=Plane(origin=(27.585279578, -11.943996137, -0.085279578), z_dir=(0.7071067811865476, 0, 0.7071067811865476)), keep=Keep.TOP, mode=Mode.PRIVATE)
    add(fillet1_piece_15)
    with BuildSketch(Plane(origin=(24.5, -8.974436833, 13.950923381), x_dir=(0.7350375444611025, -0.6780264067369298, 0), z_dir=(0, 0, -1))) as fillet1_piece_16_section:
        with BuildLine():
            CenterArc((FILLET1_R * 0.438036935241, -FILLET1_R), FILLET1_R, 90, 47.310388658)
            Line((-FILLET1_R * 0.29700060922, -FILLET1_R * 0.321973593263), (0, 0))
            Line((0, 0), (FILLET1_R * 0.438036935241, 0))
        make_face()
    fillet1_piece_16 = extrude(amount=18.950923381, mode=Mode.PRIVATE)
    fillet1_piece_16 = split(fillet1_piece_16, bisect_by=Plane(origin=(25.183285412, -8.674450436, 0), z_dir=(0, 0, -1)), keep=Keep.TOP, mode=Mode.PRIVATE)
    fillet1_piece_16 = split(fillet1_piece_16, bisect_by=Plane(origin=(27.591834999, -8.674450436, -0.091834999), z_dir=(-0.7071067811865476, 0, -0.7071067811865476)), keep=Keep.TOP, mode=Mode.PRIVATE)
    add(fillet1_piece_16)

    # Chamfer3
    chamfer3_edges = [part.edges().sort_by_distance(p)[0] for p in [
        (24.5, 0, 60),
        (0, 20, 60),
        (-24.5, 0, 60),
        (0, -20, 60),
    ]]
    chamfer(chamfer3_edges, length=CHAMFER3_SIZE)


solid = part.part
